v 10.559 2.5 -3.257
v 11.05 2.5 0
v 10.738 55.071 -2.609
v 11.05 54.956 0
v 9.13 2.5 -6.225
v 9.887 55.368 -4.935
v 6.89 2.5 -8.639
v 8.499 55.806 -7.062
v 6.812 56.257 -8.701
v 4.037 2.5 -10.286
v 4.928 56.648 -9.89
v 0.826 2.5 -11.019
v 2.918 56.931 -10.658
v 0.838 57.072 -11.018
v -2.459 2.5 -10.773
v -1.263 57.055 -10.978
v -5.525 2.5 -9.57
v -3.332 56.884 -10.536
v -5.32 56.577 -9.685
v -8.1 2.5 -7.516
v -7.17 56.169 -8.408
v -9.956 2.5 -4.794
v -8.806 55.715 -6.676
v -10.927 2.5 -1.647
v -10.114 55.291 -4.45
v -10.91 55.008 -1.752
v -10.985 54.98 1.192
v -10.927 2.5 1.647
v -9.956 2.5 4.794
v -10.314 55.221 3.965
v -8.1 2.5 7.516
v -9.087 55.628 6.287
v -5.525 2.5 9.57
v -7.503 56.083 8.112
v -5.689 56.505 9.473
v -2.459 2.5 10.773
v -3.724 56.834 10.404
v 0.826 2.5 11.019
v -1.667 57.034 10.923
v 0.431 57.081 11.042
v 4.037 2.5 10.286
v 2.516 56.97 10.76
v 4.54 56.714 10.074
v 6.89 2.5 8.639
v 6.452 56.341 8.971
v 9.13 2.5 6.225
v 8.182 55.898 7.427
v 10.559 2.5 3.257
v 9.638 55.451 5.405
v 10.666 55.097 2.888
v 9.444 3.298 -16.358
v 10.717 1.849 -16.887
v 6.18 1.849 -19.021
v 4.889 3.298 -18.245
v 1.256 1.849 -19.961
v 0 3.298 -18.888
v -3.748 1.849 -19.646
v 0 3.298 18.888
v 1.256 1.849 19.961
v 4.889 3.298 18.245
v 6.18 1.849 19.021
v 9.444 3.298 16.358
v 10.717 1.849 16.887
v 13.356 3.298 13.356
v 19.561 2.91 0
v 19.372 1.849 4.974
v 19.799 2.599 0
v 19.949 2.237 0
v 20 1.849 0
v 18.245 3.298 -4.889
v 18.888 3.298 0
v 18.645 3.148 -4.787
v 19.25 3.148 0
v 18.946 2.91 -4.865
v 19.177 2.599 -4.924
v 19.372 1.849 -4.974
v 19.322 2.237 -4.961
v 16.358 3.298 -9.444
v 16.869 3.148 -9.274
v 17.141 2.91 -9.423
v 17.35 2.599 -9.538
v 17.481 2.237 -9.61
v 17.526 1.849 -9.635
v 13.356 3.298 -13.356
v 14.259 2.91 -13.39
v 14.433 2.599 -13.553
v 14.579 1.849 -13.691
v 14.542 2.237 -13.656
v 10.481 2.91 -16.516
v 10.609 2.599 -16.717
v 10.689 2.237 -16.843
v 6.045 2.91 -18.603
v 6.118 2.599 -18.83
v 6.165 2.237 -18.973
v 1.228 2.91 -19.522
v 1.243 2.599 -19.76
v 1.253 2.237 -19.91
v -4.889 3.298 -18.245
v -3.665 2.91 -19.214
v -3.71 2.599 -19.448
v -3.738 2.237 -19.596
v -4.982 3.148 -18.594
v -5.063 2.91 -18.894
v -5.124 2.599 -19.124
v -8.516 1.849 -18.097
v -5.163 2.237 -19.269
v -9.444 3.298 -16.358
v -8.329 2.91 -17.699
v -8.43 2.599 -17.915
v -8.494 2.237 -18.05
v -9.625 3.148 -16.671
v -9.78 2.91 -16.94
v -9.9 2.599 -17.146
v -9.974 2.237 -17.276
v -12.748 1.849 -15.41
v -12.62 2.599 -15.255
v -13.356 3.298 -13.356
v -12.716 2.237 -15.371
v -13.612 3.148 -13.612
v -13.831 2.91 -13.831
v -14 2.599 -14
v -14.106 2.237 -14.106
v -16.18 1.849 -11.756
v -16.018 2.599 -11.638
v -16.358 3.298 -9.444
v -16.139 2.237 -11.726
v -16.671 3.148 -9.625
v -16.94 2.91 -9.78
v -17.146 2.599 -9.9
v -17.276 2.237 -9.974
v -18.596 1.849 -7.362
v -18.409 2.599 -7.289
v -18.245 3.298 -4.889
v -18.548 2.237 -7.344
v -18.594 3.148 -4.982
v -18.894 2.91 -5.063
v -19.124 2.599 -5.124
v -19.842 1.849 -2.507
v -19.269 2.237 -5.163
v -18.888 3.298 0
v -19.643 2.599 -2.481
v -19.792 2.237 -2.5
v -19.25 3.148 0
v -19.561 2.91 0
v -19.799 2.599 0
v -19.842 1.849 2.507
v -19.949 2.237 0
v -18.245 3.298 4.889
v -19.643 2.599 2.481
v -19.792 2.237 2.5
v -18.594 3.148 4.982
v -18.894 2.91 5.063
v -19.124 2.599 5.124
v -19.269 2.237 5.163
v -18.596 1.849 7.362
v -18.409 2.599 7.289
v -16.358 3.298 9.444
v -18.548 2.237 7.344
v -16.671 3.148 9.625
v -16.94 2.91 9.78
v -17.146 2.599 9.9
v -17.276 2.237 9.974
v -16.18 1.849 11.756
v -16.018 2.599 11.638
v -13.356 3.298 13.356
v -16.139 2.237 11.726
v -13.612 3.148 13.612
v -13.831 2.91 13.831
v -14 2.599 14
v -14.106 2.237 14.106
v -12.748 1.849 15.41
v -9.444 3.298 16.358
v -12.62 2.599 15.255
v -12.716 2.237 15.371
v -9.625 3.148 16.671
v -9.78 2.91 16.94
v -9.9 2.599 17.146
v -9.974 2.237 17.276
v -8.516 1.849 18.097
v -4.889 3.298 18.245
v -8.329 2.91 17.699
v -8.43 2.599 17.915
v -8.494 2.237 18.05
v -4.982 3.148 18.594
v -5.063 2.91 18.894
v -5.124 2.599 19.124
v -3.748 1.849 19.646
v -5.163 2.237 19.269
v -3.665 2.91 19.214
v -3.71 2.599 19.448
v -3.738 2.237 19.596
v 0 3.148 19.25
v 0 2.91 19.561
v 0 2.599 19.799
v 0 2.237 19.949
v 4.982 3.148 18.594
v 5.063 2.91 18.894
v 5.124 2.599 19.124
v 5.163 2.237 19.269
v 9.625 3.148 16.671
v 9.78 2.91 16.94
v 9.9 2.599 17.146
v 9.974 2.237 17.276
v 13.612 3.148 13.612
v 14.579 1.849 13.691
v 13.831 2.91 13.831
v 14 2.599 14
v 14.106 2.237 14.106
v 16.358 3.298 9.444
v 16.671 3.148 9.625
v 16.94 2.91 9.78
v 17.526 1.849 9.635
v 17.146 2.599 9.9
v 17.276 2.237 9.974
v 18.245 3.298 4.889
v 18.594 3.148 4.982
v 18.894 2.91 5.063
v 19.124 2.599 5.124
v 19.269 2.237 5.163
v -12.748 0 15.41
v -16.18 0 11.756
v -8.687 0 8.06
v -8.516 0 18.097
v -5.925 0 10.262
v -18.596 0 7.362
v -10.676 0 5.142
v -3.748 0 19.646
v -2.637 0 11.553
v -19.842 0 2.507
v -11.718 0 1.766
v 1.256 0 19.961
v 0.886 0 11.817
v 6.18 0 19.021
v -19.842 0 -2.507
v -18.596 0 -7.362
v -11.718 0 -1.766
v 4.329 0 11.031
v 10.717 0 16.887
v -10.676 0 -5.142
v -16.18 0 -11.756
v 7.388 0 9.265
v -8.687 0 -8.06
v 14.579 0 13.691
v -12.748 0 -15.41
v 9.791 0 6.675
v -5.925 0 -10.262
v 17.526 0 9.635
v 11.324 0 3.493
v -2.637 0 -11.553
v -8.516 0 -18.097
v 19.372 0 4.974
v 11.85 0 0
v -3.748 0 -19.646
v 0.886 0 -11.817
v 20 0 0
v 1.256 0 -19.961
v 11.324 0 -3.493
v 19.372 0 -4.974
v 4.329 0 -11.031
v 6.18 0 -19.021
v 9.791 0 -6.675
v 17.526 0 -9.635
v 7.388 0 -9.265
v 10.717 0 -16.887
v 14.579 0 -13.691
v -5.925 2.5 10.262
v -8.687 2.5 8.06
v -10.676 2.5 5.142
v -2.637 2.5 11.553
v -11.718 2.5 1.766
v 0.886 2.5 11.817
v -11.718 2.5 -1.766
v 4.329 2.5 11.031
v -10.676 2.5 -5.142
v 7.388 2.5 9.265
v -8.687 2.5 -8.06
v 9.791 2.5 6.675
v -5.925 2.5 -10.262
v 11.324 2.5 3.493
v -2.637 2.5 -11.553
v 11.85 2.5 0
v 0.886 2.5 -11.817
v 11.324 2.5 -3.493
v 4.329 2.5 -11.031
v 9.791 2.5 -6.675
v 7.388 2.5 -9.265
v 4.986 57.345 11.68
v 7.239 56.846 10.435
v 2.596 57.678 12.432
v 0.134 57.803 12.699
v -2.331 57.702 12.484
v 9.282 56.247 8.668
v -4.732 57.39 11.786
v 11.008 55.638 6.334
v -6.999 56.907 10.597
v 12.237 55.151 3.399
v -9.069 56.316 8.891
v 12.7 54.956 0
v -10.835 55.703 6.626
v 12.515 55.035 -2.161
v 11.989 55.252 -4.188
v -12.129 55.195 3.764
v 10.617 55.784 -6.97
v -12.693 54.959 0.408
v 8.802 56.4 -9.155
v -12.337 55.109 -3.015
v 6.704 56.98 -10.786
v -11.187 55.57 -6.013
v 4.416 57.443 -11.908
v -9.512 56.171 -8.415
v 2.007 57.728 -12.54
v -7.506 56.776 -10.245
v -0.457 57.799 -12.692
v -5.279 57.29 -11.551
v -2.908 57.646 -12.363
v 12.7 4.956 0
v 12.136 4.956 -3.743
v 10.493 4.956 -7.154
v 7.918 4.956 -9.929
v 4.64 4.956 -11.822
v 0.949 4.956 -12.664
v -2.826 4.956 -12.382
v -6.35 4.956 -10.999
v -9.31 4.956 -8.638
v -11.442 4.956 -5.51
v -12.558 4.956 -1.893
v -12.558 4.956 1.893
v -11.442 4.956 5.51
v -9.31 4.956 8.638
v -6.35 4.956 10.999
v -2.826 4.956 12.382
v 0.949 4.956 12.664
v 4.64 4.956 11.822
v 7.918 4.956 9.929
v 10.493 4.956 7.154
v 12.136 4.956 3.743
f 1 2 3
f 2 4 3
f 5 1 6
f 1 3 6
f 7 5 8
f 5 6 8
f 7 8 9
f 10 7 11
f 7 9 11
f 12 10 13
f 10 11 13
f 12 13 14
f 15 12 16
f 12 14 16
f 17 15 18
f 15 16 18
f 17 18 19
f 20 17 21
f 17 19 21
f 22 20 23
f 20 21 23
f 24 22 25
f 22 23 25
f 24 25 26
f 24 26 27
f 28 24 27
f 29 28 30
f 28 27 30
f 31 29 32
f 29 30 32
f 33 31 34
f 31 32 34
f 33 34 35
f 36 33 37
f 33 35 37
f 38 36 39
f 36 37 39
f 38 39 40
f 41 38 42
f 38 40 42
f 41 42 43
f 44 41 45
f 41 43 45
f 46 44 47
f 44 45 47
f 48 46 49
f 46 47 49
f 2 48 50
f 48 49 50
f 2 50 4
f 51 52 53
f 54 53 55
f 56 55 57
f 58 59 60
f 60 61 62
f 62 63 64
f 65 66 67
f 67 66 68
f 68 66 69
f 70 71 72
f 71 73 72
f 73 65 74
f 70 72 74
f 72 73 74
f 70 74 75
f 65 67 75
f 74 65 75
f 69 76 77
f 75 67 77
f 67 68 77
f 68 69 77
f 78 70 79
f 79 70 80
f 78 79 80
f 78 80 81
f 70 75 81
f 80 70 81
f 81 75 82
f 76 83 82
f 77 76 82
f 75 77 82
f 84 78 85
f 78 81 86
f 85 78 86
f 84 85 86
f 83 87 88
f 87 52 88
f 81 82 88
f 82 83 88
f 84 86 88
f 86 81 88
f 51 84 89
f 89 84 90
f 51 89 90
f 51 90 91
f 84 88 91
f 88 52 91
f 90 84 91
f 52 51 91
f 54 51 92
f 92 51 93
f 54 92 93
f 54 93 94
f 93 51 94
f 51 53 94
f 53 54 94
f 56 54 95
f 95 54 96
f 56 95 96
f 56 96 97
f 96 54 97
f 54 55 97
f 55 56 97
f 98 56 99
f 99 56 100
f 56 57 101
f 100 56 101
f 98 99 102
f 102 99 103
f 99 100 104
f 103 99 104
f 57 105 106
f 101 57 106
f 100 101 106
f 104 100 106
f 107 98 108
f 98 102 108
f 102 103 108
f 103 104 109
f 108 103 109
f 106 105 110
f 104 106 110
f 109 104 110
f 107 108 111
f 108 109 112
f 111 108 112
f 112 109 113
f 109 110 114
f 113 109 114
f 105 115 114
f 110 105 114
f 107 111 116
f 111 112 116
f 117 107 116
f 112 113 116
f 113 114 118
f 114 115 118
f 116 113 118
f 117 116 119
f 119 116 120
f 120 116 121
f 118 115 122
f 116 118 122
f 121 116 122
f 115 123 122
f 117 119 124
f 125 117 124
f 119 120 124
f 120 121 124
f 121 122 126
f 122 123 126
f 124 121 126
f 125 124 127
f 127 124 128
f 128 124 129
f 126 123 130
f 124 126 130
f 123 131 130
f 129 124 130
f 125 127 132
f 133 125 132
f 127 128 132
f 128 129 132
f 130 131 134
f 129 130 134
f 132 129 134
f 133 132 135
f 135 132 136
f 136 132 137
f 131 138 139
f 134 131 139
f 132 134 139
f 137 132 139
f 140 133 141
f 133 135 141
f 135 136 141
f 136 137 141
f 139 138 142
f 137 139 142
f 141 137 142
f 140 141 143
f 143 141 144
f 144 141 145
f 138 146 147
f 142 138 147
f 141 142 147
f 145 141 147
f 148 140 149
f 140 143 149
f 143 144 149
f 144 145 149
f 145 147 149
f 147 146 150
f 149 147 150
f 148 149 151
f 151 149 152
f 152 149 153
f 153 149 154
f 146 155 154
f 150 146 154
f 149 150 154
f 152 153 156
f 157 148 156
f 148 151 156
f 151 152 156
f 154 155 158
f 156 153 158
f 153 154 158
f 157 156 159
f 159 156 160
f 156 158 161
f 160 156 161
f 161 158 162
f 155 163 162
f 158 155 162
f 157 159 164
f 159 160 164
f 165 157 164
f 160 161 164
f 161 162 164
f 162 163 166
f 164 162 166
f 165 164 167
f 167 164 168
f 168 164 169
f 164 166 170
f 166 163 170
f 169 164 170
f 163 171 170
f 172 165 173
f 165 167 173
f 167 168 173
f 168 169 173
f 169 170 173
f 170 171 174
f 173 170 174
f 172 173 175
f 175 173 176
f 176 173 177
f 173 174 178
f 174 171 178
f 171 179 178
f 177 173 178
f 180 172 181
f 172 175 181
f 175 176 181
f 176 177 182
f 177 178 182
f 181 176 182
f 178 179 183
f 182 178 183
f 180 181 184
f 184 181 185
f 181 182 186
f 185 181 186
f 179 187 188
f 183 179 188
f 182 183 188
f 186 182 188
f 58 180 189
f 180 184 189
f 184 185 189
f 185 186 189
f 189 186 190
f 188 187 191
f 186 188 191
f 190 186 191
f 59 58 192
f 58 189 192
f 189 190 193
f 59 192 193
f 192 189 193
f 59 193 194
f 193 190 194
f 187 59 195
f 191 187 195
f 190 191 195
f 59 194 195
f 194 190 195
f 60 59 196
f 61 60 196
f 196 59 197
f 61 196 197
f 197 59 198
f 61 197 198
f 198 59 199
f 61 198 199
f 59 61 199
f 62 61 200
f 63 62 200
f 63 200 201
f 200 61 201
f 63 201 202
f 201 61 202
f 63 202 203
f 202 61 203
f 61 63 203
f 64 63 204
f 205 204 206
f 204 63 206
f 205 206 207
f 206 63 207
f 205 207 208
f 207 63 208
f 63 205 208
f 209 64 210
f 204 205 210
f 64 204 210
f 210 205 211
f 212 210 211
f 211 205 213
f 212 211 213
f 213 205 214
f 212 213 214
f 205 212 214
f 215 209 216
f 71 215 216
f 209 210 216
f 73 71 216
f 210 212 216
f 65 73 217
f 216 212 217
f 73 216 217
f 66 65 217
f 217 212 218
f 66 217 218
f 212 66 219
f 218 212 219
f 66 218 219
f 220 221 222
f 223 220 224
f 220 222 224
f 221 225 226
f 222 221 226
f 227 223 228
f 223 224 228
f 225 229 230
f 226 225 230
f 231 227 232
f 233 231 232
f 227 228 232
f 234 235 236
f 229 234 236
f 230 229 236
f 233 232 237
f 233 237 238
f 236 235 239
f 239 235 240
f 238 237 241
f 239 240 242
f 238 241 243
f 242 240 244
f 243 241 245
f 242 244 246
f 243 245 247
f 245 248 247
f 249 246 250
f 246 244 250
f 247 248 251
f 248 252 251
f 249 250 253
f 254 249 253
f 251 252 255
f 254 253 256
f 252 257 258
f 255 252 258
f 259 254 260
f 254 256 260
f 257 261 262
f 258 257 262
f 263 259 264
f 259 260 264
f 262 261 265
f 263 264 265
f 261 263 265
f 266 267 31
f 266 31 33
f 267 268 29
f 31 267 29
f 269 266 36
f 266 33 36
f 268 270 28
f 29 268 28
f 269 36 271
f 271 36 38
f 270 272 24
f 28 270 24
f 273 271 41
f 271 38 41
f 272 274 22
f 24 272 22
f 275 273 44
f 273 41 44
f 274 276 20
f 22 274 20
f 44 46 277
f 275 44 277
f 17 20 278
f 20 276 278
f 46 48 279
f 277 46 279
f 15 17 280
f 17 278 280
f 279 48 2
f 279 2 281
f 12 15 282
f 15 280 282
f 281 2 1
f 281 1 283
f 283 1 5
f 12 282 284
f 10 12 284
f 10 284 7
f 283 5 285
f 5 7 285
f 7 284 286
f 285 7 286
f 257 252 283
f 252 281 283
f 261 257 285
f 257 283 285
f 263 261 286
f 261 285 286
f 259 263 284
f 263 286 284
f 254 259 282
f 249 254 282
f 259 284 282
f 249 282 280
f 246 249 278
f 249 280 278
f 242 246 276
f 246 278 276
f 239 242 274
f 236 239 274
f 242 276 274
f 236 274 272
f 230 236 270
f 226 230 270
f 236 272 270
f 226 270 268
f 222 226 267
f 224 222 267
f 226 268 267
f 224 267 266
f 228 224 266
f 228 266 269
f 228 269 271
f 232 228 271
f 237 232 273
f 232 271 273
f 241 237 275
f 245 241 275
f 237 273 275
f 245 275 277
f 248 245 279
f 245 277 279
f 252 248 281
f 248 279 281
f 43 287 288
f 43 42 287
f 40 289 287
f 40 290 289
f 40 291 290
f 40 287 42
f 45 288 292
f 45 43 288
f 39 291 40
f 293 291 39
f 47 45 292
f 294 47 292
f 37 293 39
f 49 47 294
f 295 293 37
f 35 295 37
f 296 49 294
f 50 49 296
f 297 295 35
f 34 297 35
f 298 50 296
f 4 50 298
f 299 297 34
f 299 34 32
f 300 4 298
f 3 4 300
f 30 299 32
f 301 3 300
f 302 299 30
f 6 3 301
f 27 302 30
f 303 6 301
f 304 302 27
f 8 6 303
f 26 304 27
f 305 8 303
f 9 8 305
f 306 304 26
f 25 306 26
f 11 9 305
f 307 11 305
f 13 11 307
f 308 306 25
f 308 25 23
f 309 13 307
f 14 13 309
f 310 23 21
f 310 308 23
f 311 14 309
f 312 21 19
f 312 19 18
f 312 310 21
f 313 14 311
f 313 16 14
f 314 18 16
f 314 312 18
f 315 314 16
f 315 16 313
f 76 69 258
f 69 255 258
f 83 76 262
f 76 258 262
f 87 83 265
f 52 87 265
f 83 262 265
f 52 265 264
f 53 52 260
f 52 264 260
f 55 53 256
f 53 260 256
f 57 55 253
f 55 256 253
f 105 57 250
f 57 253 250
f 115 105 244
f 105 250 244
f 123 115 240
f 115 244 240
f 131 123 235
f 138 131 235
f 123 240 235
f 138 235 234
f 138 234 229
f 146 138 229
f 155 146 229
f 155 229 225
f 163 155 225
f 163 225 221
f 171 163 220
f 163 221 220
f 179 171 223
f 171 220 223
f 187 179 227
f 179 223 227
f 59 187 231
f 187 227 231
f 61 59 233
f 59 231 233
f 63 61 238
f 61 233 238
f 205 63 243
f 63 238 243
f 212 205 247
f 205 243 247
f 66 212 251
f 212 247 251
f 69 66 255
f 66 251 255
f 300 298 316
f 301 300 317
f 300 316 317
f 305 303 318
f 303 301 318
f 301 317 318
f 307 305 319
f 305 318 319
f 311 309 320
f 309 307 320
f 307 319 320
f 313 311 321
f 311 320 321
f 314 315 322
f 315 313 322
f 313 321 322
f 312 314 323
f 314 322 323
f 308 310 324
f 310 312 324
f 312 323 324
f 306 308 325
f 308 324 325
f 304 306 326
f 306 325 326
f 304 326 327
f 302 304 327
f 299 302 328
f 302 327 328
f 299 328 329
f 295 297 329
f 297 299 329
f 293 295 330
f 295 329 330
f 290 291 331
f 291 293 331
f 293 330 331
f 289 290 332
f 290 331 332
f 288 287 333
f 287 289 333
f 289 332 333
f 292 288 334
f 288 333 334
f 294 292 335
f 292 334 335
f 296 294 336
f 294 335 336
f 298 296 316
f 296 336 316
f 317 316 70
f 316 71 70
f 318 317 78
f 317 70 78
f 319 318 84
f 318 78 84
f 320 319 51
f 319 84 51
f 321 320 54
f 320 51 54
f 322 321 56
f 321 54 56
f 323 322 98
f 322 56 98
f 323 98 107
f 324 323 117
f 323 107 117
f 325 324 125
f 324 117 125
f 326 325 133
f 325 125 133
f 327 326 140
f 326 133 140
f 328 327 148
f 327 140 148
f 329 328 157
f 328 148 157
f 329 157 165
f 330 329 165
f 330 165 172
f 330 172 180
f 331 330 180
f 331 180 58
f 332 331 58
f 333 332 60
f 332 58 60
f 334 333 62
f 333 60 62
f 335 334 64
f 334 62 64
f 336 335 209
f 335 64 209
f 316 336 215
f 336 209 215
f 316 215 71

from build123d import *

# Parameters (mm, degrees)
SKETCH2_R               = 29.75
CUT_EXTRUDE2_DEPTH      = 21
CUT_EXTRUDE2_DEPTH_BACK = 21


with BuildPart() as part:
    # Sketch1 → Revolve1 (revolve)
    with BuildSketch(Plane(origin=(0, 0, 0), x_dir=(-1, 0, 0), z_dir=(0, 0, -1))):
        with BuildLine():
            Line((-12.7, 4.956029105), (-18.888228568, 3.297898257))
            ThreePointArc((-18.888228568, 3.297898257), (-19.69003001, 2.762151662), (-20, 1.849009518))
            Line((-20, 1.849009518), (-20, 0))
            Line((-20, 0), (-11.85, 0))
            Line((-11.85, 0), (-11.85, 2.5))
            Line((-11.85, 2.5), (-11.05, 2.5))
            Line((-11.05, 2.5), (-11.05, 70))
            Line((-11.05, 70), (-12.7, 70))
            Line((-12.7, 70), (-12.7, 4.956029105))
        make_face()
    revolve(axis=Axis((0, 0, 0), (0, 1, 0)))

    # Sketch2 → Cut-Extrude2 (cut, two sides)
    with BuildSketch(Plane(origin=(0, 0, 0), x_dir=(0, 0, -1), z_dir=(1, 0, 0))) as cut_extrude2_sk:
        with Locations((0, 84.706029105)):
            Circle(SKETCH2_R)
    extrude(amount=CUT_EXTRUDE2_DEPTH, mode=Mode.SUBTRACT)
    extrude(cut_extrude2_sk.sketch, amount=-CUT_EXTRUDE2_DEPTH_BACK, mode=Mode.SUBTRACT)


solid = part.part
